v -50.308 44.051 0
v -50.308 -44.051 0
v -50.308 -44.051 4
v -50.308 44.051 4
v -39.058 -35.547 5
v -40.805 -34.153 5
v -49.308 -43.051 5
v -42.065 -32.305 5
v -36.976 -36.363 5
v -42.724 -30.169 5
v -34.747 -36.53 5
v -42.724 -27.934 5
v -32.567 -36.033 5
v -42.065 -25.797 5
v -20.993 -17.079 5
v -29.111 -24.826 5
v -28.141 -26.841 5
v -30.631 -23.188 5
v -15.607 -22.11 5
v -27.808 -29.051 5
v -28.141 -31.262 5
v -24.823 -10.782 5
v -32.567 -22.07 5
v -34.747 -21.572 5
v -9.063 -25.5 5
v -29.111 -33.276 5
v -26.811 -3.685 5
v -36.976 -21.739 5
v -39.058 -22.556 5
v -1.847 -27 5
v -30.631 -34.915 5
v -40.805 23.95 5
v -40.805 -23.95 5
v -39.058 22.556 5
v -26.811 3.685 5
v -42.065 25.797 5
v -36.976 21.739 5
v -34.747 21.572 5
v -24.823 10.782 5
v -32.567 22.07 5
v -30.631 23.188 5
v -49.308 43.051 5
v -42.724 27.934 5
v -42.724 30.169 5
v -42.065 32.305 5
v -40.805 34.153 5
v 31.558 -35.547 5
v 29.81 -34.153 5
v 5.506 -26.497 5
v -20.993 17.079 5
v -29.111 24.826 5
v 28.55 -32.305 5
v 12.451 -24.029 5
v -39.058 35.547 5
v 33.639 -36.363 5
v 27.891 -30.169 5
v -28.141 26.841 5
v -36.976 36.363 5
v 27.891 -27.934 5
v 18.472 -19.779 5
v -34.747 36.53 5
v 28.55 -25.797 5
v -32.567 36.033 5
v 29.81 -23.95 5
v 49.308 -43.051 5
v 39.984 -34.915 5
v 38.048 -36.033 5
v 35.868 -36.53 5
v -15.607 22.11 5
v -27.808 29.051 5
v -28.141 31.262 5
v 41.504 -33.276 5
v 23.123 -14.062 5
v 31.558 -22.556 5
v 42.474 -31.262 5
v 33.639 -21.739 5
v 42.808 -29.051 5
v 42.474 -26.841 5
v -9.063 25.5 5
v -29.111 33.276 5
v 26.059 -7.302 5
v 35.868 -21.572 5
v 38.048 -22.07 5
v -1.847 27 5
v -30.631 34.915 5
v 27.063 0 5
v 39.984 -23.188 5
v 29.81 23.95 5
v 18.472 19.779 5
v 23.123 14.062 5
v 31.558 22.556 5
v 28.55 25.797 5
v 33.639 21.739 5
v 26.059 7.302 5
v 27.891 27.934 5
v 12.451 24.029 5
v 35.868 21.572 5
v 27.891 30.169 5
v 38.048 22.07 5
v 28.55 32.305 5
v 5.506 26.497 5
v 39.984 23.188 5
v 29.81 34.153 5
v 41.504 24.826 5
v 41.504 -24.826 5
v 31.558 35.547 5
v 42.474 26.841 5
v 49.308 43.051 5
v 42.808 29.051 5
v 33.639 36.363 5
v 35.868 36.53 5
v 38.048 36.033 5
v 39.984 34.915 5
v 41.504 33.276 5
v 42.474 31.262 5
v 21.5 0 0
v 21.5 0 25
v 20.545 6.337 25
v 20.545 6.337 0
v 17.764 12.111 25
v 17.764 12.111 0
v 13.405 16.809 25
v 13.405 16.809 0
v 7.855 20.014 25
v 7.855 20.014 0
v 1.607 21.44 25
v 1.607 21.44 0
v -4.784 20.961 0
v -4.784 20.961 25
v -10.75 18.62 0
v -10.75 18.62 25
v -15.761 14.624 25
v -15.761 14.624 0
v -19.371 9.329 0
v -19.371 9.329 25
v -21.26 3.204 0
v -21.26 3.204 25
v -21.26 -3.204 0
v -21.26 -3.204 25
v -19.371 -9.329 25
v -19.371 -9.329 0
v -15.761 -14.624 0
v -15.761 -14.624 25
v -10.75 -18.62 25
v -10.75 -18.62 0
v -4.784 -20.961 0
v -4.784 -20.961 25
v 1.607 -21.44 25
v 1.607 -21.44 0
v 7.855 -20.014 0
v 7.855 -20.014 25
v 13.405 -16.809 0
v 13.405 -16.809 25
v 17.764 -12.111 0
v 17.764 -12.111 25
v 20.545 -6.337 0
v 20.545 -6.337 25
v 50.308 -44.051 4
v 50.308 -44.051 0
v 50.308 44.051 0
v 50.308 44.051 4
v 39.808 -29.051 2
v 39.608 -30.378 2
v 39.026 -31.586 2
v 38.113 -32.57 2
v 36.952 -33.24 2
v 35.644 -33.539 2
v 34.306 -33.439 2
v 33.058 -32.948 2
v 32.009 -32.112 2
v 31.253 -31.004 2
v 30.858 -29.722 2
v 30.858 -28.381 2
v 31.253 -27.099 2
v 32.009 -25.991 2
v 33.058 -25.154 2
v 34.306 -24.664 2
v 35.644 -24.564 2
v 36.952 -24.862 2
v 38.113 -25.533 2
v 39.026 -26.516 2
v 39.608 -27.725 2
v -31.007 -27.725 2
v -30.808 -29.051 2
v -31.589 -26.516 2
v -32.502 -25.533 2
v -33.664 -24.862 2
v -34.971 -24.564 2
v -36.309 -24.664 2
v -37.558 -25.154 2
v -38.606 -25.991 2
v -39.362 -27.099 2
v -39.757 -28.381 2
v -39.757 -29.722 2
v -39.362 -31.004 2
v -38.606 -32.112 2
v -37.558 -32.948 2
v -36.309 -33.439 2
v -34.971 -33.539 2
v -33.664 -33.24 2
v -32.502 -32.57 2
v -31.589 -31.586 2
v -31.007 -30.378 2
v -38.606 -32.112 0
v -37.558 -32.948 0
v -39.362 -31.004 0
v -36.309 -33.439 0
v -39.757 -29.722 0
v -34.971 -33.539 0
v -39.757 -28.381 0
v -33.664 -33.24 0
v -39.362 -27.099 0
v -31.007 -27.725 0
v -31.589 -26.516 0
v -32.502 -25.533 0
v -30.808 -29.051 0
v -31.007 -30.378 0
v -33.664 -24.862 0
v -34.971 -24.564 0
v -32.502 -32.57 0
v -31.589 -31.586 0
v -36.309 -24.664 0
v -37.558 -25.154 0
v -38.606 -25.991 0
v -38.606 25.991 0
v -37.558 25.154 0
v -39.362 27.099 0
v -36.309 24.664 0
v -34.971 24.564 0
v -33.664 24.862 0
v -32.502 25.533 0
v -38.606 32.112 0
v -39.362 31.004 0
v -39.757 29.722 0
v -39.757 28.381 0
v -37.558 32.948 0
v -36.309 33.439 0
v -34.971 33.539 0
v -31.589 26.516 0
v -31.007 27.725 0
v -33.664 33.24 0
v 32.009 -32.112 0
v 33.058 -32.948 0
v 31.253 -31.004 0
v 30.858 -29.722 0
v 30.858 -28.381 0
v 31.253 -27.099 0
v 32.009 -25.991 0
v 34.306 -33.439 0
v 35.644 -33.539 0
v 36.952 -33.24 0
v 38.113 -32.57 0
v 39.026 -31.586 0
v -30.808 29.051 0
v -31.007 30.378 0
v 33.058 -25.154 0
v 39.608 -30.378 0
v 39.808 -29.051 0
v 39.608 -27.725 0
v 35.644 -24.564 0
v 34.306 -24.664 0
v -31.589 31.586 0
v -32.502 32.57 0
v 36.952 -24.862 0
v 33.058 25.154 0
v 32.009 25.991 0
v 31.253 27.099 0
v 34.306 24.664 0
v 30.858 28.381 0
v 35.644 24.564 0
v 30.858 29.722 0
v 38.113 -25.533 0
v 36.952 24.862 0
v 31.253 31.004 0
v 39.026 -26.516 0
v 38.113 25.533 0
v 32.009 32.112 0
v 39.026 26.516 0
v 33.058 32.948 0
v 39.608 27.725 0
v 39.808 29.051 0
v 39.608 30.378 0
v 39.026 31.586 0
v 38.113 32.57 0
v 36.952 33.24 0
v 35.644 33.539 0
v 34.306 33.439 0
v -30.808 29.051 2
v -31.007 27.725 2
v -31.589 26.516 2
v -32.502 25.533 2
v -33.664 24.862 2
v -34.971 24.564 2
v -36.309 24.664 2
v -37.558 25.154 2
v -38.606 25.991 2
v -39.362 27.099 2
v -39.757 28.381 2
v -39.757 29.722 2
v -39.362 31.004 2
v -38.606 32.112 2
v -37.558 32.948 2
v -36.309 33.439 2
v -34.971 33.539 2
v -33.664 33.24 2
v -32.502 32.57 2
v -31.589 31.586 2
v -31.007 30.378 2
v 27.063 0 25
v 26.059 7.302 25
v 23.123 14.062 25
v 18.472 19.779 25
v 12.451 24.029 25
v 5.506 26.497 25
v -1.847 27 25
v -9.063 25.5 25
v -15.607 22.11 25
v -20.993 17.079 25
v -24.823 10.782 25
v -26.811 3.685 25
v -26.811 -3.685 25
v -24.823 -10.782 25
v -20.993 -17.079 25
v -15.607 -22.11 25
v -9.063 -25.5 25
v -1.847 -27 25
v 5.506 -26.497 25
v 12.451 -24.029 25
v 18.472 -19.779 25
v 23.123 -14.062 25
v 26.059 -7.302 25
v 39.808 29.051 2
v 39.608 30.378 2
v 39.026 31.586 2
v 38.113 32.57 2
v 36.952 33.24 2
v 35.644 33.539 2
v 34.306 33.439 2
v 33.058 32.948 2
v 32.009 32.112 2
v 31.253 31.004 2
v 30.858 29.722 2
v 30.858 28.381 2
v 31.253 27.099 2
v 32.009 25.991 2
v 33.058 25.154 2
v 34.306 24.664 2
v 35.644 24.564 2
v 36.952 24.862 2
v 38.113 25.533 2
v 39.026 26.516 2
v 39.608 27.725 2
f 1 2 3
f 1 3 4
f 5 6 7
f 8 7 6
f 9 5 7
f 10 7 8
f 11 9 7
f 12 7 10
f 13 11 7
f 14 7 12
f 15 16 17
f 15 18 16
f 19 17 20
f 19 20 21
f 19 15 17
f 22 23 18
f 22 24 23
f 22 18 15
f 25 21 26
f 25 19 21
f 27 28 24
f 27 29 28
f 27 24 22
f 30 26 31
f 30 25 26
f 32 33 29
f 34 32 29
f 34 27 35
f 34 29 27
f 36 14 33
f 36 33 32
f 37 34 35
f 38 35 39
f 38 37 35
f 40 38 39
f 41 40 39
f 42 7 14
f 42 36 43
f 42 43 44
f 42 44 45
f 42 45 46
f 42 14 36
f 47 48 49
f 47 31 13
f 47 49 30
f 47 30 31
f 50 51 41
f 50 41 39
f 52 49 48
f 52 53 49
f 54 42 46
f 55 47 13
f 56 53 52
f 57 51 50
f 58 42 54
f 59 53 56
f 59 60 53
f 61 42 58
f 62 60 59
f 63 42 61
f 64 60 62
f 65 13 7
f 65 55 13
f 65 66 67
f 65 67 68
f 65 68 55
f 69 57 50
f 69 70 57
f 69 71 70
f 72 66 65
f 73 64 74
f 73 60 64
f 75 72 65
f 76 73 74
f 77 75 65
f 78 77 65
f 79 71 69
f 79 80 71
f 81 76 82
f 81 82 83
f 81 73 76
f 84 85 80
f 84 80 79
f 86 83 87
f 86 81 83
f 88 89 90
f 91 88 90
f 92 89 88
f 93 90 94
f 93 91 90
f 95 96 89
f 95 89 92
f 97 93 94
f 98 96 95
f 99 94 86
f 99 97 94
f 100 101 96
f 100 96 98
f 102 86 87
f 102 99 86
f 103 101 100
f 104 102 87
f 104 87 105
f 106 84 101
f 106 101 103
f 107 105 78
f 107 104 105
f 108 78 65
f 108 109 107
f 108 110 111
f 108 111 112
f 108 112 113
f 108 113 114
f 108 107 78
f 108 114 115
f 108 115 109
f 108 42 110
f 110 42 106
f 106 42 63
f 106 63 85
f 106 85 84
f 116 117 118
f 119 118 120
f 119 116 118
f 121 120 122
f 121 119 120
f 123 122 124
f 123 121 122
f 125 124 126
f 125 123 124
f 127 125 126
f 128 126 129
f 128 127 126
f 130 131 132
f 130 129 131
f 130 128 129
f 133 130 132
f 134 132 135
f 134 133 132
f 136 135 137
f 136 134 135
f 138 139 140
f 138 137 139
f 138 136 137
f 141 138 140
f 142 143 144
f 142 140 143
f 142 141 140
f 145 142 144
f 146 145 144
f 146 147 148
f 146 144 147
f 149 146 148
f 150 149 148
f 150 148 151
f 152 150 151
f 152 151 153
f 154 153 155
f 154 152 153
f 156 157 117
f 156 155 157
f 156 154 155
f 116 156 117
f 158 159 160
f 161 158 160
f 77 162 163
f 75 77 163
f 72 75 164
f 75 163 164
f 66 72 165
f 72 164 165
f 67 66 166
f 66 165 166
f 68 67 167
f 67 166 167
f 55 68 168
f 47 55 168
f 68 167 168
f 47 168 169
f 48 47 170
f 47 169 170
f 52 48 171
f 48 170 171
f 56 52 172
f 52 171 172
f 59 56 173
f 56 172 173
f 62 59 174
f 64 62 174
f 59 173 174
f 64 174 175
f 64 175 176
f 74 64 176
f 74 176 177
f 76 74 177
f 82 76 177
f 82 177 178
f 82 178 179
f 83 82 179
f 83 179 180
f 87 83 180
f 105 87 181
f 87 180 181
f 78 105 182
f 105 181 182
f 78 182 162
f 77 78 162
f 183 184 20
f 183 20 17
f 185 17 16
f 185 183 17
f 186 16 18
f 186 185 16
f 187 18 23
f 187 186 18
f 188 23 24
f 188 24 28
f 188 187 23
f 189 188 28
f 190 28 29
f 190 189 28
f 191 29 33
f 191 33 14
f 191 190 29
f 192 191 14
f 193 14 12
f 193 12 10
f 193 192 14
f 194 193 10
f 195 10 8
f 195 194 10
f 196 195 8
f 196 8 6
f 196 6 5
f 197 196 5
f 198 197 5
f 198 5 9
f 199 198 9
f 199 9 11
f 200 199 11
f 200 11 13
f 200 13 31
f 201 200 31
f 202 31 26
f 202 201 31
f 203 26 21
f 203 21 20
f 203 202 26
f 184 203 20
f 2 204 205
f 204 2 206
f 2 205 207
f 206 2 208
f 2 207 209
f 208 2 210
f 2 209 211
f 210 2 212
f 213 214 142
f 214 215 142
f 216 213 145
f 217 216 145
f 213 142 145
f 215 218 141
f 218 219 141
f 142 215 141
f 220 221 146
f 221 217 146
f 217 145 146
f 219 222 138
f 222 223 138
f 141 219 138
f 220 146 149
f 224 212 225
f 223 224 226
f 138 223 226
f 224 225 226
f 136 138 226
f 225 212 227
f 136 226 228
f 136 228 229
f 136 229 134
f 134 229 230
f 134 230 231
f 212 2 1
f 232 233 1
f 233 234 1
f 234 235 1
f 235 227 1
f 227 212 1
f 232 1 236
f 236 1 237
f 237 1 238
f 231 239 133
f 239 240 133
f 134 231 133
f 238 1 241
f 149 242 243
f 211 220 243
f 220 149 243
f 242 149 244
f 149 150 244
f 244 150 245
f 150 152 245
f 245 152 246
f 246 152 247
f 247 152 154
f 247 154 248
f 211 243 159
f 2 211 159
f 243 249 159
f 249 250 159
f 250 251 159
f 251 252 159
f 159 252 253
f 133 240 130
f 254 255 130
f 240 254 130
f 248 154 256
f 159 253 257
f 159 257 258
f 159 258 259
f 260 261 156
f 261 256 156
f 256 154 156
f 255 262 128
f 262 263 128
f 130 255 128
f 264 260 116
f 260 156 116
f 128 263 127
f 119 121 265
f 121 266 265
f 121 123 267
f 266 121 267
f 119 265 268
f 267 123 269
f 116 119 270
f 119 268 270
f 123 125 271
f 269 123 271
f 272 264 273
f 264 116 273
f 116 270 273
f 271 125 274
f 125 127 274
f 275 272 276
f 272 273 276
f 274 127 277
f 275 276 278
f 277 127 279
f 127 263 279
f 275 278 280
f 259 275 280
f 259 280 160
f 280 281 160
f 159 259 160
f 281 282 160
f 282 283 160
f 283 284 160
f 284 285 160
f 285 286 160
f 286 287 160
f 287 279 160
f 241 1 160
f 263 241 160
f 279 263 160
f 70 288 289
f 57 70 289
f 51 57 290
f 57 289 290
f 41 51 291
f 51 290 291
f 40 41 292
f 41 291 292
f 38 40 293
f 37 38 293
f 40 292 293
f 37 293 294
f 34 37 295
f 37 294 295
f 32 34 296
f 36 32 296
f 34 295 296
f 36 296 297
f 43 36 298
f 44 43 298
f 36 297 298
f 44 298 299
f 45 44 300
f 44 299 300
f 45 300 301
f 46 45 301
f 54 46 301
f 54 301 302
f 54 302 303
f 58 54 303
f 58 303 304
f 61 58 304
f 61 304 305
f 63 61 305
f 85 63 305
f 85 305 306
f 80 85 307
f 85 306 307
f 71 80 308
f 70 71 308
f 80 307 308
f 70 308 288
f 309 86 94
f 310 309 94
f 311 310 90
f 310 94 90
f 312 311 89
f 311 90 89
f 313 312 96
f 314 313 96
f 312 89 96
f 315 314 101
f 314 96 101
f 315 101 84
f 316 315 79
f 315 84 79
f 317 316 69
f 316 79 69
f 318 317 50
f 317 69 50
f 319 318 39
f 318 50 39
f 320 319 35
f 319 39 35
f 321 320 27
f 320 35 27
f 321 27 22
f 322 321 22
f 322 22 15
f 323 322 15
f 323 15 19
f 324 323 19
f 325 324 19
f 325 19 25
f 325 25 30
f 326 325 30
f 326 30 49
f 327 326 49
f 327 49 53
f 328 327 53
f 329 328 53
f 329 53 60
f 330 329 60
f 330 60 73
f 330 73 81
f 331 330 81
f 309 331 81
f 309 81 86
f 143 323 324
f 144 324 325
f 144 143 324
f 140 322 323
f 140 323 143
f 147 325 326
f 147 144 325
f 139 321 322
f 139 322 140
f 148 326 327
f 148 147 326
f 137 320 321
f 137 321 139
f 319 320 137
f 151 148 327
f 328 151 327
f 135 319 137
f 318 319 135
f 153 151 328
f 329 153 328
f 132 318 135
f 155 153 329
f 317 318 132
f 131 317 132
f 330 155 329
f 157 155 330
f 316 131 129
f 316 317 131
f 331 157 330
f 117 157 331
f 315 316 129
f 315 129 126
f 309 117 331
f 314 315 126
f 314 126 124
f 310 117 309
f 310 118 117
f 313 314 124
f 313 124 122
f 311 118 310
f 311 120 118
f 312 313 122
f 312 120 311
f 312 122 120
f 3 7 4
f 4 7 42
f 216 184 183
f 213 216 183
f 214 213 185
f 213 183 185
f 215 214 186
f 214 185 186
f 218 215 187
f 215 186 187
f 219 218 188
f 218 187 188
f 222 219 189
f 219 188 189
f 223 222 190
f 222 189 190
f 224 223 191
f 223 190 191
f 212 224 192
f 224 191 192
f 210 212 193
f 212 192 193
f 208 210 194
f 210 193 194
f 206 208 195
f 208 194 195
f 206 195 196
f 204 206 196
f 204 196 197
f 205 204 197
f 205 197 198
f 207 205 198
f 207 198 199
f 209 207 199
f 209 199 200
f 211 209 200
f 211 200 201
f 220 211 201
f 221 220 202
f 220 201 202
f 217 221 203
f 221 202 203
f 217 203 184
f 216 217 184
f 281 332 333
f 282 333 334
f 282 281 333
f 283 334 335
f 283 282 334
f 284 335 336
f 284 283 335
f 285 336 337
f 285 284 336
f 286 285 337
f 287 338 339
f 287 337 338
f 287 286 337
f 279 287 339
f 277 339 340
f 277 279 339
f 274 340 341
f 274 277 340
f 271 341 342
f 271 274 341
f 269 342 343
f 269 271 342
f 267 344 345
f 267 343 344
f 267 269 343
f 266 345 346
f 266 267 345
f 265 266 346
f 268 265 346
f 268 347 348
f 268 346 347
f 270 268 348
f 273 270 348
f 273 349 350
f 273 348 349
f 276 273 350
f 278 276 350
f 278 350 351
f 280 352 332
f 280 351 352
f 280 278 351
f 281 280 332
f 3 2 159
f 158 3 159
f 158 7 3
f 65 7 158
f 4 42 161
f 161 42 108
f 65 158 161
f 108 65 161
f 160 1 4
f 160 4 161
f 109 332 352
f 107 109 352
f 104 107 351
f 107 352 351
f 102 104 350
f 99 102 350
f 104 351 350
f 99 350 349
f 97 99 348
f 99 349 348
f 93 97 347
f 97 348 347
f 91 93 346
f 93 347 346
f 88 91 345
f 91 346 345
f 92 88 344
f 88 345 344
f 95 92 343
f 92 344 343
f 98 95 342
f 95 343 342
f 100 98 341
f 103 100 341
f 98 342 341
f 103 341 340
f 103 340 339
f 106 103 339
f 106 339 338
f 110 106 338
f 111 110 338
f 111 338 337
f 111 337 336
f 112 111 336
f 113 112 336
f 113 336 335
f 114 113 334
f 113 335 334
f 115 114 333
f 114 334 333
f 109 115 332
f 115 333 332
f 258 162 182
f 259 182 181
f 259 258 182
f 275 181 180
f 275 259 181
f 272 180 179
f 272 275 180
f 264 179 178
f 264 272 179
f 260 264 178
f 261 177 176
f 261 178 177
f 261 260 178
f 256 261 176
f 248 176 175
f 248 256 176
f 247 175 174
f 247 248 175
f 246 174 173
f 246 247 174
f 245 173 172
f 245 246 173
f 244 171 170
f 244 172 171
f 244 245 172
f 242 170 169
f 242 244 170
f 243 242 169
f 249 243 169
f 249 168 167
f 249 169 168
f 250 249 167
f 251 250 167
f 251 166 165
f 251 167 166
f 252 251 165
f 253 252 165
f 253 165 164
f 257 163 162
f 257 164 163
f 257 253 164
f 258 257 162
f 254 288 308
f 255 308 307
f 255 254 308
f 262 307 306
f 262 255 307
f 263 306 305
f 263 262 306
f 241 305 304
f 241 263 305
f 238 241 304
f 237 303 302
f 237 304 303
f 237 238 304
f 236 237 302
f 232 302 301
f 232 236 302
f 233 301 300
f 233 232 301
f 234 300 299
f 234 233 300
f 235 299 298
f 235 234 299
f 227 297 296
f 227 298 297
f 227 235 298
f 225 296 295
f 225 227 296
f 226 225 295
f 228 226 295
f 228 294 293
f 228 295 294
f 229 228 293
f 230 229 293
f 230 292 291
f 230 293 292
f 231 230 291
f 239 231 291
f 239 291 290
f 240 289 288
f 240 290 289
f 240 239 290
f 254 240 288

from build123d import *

# Parameters (mm, degrees)
F0_R     = 27.06303
F1_DEPTH = 25
F0_W     = 100.61507
F0_H     = 88.102676
F2_DEPTH = 5
F3_SIZE  = 1
F4_R     = 21.5
F5_DEPTH = 30
F6_R     = 4.5
F7_DEPTH = 12.5
F8_SIZE  = 3


with BuildPart() as f1:
    # F0 (on Top) → F1 (new body)
    with BuildSketch(Plane.XY):
        Circle(F0_R)
    extrude(amount=F1_DEPTH)

    # F0 (on Top) → F2 (join)
    with BuildSketch(Plane.XY):
        Rectangle(F0_W, F0_H)
        Circle(F0_R, mode=Mode.SUBTRACT)
    extrude(amount=F2_DEPTH)

    # F3
    f3_edges = [f1.edges().sort_by_distance(p)[0] for p in [
        (-50.307535, 0, 5),
        (0, -44.051338, 5),
        (50.307535, 0, 5),
        (0, 44.051338, 5),
    ]]
    chamfer(f3_edges, length=F3_SIZE)

    # F4 (on Top) → F5 (cut)
    with BuildSketch(Plane.XY):
        Circle(F4_R)
    extrude(amount=F5_DEPTH, mode=Mode.SUBTRACT)

    # F6 (on Top) → F7 (cut, symmetric)
    with BuildSketch(Plane.XY):
        with Locations((35.307535, -29.051338)):
            Circle(F6_R)
        with Locations((35.307535, 29.051338)):
            Circle(F6_R)
        with Locations((-35.307535, 29.051338)):
            Circle(F6_R)
        with Locations((-35.307535, -29.051338)):
            Circle(F6_R)
    extrude(amount=F7_DEPTH, both=True, mode=Mode.SUBTRACT)

    # F8
    f8_edges = [f1.edges().sort_by_distance(p)[0] for p in [
        (-39.807535, -29.051338, 5),
        (-39.807535, 29.051338, 5),
        (30.807535, 29.051338, 5),
        (30.807535, -29.051338, 5),
    ]]
    chamfer(f8_edges, length=F8_SIZE)


solid = f1.part
